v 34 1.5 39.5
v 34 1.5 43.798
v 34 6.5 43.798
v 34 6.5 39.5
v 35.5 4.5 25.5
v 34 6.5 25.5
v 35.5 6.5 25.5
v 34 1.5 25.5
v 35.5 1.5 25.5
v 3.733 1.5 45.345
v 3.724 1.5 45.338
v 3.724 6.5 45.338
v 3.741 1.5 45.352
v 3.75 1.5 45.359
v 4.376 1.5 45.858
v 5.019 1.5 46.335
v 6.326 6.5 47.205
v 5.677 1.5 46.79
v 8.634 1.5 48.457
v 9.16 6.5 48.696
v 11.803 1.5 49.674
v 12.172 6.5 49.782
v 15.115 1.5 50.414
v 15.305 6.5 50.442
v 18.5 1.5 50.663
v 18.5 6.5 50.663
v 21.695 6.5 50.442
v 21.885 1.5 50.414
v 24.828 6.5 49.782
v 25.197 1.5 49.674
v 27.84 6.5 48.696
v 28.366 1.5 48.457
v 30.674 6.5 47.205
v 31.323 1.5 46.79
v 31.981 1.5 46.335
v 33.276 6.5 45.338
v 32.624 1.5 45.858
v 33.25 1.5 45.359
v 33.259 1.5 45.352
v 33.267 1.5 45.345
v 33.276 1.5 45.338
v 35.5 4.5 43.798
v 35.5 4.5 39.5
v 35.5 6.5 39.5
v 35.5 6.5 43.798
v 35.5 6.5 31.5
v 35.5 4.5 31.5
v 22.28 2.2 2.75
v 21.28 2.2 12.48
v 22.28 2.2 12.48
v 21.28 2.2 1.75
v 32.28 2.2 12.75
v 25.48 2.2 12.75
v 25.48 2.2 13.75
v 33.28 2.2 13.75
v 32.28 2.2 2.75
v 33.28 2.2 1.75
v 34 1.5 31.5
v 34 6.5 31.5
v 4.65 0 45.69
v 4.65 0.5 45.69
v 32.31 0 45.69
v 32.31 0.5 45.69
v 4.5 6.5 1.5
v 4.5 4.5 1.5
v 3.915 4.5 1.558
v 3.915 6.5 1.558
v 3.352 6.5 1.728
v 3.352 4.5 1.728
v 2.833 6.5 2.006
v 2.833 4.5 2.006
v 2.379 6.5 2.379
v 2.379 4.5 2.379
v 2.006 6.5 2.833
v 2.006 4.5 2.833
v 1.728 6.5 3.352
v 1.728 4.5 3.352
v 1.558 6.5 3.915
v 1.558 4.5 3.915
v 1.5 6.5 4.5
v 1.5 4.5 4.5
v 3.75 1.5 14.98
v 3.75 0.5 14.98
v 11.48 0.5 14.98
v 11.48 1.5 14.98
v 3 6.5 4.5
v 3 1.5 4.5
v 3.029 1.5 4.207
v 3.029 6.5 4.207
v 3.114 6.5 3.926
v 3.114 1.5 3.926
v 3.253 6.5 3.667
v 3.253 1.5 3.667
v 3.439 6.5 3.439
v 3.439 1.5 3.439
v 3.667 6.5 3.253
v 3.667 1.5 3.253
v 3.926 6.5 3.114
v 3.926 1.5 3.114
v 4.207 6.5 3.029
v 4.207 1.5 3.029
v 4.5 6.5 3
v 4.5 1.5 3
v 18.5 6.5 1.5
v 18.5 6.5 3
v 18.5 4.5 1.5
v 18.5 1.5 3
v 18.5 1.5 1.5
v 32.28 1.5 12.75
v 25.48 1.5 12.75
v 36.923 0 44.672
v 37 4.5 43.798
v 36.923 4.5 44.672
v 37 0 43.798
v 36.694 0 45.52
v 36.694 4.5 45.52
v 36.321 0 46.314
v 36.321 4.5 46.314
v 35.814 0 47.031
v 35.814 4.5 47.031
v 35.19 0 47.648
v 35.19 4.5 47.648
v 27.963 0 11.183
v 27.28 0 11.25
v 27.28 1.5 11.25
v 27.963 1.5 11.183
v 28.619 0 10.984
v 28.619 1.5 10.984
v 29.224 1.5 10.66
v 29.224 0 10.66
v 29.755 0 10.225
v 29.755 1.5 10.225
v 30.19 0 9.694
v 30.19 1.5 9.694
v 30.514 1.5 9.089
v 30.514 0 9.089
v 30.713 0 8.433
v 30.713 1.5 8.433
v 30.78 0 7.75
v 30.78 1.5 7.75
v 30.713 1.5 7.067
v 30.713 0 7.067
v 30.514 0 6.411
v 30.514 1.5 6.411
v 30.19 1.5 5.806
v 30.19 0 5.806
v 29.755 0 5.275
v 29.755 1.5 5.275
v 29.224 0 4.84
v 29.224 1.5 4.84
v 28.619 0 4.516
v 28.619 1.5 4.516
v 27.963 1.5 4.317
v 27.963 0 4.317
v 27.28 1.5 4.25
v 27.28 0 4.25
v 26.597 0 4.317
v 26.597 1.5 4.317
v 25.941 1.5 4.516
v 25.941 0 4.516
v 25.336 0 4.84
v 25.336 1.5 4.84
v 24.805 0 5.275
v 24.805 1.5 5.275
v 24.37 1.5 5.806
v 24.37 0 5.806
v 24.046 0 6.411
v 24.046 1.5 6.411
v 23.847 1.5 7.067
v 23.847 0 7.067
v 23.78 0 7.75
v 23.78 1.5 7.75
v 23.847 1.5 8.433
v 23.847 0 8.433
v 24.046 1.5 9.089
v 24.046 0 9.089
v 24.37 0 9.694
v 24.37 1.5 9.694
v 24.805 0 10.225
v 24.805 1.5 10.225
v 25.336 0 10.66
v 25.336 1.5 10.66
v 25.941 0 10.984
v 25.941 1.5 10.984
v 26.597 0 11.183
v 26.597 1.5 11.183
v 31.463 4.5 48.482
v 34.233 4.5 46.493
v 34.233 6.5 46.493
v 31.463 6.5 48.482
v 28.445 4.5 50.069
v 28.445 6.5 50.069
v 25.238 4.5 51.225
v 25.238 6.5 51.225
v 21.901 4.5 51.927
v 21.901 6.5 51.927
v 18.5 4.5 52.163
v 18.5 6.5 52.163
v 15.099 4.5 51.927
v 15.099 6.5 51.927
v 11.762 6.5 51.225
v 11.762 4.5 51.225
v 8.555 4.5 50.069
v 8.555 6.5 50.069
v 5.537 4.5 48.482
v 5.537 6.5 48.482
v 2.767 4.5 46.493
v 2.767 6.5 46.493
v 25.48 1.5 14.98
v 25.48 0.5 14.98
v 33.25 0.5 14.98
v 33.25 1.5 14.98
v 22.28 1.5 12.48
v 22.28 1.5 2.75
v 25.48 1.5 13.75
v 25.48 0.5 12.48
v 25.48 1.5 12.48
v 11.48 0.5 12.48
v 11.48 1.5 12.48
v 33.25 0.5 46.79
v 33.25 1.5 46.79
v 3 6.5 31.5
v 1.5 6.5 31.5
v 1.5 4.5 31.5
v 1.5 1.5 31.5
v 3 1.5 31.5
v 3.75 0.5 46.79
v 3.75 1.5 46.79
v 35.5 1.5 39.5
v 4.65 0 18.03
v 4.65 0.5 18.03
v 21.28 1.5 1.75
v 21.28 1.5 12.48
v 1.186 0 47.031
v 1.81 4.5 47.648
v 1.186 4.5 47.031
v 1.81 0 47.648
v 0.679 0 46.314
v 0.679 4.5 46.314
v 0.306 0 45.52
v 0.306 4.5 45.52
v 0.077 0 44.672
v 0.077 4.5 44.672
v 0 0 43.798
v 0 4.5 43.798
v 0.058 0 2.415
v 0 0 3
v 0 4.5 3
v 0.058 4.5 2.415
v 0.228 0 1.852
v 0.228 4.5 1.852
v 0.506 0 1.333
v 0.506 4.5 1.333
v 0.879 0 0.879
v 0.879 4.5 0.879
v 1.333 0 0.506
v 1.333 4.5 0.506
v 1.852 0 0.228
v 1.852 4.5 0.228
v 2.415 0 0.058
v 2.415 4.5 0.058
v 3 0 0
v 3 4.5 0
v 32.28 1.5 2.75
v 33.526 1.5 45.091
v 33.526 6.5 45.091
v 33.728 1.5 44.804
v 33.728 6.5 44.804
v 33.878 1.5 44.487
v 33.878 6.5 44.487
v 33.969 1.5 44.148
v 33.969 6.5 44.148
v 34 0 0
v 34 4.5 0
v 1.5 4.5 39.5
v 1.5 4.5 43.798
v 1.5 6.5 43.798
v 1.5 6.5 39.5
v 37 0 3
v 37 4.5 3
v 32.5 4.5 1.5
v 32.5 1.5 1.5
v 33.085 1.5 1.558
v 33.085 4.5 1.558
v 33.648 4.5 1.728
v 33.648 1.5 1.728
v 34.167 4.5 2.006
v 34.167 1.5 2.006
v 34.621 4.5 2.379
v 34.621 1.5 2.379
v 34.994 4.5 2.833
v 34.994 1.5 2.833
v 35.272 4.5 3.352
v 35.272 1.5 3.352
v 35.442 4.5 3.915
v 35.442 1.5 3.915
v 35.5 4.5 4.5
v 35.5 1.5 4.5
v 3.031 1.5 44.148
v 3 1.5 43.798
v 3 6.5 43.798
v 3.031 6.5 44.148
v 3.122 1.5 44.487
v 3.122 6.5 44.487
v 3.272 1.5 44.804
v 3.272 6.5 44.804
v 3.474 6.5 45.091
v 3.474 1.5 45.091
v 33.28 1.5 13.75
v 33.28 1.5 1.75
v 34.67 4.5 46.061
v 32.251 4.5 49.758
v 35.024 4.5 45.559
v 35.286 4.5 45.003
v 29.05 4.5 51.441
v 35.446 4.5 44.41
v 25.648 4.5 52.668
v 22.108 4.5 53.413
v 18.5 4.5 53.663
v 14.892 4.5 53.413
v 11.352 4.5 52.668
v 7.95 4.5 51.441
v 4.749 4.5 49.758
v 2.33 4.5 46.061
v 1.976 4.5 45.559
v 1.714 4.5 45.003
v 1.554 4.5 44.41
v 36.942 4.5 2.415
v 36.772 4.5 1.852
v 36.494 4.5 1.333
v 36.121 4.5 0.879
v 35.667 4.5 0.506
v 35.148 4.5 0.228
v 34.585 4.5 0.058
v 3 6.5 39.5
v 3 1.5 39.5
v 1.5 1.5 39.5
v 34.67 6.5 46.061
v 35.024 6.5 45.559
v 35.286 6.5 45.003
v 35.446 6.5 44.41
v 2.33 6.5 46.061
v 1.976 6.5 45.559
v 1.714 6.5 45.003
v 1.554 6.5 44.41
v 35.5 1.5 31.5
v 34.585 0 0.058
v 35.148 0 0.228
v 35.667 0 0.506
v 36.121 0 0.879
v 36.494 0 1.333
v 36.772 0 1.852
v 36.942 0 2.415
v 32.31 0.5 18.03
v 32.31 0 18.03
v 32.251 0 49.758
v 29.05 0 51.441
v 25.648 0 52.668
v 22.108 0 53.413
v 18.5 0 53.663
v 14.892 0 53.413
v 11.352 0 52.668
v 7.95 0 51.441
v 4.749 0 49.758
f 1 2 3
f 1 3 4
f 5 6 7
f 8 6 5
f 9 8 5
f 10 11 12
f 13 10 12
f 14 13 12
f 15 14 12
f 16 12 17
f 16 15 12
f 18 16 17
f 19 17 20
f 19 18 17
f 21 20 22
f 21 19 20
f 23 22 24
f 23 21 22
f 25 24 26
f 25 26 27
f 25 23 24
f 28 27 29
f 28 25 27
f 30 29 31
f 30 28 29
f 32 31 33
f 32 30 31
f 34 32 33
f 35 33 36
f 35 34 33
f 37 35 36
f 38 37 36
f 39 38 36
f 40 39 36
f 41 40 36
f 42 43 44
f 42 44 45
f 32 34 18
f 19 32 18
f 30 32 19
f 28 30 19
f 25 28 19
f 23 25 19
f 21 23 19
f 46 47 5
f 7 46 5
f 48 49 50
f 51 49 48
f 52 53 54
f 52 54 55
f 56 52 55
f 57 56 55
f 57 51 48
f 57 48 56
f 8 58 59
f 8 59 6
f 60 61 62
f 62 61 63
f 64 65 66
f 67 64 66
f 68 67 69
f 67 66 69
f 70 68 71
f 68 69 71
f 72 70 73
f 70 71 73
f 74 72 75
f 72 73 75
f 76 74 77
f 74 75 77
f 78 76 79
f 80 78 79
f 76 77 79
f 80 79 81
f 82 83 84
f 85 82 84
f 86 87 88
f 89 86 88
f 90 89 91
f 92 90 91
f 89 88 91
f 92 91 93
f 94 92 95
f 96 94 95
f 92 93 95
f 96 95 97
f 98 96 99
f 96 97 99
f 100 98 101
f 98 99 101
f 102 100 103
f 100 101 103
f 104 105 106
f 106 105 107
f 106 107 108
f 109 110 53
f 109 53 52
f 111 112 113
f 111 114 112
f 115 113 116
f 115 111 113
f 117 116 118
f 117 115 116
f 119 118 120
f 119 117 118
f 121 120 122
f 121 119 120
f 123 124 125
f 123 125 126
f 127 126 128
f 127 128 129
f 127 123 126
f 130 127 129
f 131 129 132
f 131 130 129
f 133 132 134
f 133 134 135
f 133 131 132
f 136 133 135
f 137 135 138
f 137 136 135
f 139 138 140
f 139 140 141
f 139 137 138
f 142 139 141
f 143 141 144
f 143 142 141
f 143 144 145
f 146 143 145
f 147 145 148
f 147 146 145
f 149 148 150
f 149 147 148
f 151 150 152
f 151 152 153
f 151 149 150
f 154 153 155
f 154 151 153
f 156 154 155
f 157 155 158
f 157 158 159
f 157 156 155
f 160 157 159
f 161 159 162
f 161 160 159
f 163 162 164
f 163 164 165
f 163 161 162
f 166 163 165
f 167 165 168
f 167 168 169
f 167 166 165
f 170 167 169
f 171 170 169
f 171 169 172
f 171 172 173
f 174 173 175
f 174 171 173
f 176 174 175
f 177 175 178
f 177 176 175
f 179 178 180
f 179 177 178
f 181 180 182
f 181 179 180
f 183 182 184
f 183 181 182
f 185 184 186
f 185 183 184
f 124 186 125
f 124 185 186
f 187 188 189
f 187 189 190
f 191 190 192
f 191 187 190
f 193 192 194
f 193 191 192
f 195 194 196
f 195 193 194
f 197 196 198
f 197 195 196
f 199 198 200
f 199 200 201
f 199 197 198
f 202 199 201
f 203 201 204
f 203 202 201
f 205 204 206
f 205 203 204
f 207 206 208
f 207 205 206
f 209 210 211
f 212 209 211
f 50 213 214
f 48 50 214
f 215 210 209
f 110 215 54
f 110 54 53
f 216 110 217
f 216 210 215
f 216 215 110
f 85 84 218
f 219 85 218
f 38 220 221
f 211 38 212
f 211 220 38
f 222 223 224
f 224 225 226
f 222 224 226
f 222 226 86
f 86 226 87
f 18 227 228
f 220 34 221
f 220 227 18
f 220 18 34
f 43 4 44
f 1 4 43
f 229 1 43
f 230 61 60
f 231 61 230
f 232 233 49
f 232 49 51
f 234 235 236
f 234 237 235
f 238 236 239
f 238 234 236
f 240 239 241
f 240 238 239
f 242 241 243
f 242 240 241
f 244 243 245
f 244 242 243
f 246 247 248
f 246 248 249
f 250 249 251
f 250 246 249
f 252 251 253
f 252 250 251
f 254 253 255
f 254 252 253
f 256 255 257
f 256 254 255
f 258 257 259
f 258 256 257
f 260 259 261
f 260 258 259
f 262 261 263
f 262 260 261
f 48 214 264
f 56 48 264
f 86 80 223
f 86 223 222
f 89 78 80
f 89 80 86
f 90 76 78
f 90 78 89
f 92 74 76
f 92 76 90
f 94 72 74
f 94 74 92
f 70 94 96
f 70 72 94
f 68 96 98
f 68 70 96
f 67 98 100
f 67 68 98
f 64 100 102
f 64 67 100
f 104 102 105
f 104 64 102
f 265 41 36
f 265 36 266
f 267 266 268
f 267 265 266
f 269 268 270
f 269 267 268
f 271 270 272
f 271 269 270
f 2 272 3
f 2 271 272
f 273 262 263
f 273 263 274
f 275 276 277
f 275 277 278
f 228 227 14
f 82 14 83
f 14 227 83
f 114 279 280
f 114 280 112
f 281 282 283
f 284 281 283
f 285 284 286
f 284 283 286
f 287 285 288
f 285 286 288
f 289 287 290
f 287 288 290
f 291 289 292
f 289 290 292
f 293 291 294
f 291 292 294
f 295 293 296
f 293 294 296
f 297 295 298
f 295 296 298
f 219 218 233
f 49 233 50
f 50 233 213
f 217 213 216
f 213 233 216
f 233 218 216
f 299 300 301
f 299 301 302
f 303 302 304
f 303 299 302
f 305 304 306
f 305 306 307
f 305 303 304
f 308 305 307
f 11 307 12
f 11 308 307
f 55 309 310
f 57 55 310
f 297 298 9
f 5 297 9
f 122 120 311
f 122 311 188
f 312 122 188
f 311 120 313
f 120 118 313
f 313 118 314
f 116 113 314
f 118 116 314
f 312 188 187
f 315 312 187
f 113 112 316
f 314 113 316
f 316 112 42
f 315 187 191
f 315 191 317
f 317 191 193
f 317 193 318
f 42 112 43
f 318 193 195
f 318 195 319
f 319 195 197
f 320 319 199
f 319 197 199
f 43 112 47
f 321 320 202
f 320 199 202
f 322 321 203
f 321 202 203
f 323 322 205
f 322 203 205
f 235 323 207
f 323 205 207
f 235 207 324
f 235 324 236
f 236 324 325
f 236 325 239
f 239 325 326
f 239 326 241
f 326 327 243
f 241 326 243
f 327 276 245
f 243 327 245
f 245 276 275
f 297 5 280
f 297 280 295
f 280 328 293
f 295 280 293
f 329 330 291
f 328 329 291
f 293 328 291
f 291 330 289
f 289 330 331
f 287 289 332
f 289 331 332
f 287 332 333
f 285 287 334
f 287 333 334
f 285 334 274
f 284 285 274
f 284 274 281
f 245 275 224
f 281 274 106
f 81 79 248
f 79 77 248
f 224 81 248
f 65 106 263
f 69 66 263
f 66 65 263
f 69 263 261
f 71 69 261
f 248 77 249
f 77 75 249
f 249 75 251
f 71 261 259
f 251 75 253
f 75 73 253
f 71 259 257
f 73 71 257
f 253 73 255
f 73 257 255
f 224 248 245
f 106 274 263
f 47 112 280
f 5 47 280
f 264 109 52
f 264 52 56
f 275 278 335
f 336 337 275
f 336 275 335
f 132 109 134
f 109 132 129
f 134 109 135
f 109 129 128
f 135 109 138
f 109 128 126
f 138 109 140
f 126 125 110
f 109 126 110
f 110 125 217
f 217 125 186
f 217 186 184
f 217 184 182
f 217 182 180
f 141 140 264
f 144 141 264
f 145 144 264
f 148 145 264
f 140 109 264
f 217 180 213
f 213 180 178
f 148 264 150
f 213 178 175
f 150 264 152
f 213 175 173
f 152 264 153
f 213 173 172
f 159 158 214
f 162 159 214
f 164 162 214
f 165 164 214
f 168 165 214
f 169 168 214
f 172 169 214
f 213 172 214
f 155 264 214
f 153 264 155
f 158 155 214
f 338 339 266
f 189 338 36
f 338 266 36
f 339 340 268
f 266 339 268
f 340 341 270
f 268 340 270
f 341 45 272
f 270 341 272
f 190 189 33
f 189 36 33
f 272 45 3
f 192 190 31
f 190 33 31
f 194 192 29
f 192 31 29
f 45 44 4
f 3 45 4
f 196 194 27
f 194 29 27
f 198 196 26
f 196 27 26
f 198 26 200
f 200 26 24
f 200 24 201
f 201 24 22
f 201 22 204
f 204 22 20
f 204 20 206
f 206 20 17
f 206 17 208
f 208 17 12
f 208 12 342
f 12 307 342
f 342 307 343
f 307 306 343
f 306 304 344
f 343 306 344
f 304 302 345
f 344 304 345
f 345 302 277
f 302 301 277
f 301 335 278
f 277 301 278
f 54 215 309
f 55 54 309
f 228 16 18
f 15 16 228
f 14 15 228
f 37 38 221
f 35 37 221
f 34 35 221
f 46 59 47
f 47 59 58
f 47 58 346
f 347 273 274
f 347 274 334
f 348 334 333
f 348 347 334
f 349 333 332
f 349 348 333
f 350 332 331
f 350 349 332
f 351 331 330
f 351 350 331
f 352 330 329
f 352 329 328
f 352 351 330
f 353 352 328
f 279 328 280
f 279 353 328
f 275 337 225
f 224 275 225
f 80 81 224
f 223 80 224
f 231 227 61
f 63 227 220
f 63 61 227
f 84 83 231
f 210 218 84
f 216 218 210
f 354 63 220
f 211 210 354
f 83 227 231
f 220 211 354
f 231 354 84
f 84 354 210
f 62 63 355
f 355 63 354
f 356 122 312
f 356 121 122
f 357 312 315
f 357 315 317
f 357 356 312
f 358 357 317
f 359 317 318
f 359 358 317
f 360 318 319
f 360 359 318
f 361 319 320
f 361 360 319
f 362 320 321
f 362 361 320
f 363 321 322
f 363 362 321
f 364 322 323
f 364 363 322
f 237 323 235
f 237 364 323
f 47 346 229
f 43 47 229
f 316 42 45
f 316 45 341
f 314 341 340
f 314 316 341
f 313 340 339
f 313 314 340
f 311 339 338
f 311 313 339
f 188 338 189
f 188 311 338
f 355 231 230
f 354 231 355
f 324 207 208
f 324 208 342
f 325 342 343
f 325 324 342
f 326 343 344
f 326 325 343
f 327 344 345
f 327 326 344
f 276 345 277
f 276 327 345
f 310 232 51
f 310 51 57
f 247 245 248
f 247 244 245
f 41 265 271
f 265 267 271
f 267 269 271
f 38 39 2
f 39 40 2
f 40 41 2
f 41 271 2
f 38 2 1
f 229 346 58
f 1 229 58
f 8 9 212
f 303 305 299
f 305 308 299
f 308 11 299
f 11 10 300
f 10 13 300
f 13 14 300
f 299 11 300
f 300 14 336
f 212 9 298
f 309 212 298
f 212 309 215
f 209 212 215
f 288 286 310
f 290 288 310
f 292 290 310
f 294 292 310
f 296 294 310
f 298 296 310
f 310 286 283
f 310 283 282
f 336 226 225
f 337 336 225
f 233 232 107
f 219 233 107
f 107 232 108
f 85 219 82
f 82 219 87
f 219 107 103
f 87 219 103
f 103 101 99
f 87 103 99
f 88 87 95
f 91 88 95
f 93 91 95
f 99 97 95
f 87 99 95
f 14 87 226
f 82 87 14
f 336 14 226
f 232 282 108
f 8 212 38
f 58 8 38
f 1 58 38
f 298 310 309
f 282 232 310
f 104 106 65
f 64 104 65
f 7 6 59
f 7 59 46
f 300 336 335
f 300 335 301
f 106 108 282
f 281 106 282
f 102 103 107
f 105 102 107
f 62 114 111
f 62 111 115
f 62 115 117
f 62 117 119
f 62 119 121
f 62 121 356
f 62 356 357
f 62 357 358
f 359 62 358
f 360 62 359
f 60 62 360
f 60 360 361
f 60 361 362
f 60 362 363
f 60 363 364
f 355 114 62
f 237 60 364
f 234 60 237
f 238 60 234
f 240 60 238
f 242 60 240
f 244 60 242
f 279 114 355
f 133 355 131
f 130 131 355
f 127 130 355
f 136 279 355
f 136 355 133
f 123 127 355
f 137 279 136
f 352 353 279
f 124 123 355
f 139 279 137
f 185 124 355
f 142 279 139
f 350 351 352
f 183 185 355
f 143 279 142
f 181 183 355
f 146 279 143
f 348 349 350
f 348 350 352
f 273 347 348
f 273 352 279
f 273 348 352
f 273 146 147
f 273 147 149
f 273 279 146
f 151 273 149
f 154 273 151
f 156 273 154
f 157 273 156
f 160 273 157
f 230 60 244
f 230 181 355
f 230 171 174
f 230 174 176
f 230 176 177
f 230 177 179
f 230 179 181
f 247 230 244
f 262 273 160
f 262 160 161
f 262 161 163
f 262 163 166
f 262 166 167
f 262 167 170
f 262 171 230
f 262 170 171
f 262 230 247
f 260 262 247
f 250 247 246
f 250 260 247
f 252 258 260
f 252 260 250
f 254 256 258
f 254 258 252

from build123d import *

# Parameters (mm, degrees)
SKETCH1_R               = 3.5
BOSS_EXTRUDE1_DEPTH     = 1.5
BOSS_EXTRUDE2_DEPTH     = 3
SKETCH3_W               = 12
SKETCH3_H               = 12
SKETCH3_W_2             = 10
SKETCH3_H_2             = 10
BOSS_EXTRUDE3_DEPTH     = 0.7
SKETCH5_W               = 27.66
SKETCH5_H               = 27.66
CUT_EXTRUDE1_DEPTH      = 66.25114788
CUT_EXTRUDE2_DEPTH      = 66.25114788
CUT_EXTRUDE2_DEPTH_BACK = 1
SKETCH6_W               = 29.5
SKETCH6_H               = 31.81
CUT_EXTRUDE3_DEPTH      = 66.25114788
CUT_EXTRUDE3_DEPTH_BACK = 1
SKETCH4_W               = 14
SKETCH4_H               = 2.5
BOSS_EXTRUDE5_START     = -3
SKETCH8_W               = 1.5
SKETCH8_H               = 6
BOSS_EXTRUDE5_DEPTH     = 5


with BuildPart() as part:
    # Sketch1 → Boss-Extrude1 (new body)
    with BuildSketch(Plane(origin=(0, 0, 0), x_dir=(1, 0, 0), z_dir=(0, 1, 0))):
        with BuildLine():
            Line((0, -43.797867681), (0, -43))
            Line((0, -43), (0, -3))
            ThreePointArc((0, -3), (0.878679656, -0.878679656), (3, 0))
            Line((3, 0), (34, 0))
            ThreePointArc((34, 0), (36.121320344, -0.878679656), (37, -3))
            Line((37, -3), (37, -43))
            Line((37, -43), (37, -43.797867681))
            ThreePointArc((37, -43.797867681), (36.524802839, -45.925344888), (35.189536294, -47.648433643))
            ThreePointArc((35.189536294, -47.648433643), (18.5, -53.662950904), (1.810463706, -47.648433643))
            ThreePointArc((1.810463706, -47.648433643), (0.475197161, -45.925344888), (0, -43.797867681))
        make_face()
        with Locations(Location((27.28, -7.75, 0), (0, 0, 270))):
            Circle(SKETCH1_R, mode=Mode.SUBTRACT)
    extrude(amount=BOSS_EXTRUDE1_DEPTH)

    # Sketch2 → Boss-Extrude2 (add)
    with BuildSketch(Plane(origin=(0, 1.5, 0), x_dir=(1, 0, 0), z_dir=(0, 1, 0))):
        with BuildLine():
            Line((0, -43.797867681), (0, -43))
            Line((0, -43), (0, -3))
            ThreePointArc((0, -3), (0.878679656, -0.878679656), (3, 0))
            Line((3, 0), (34, 0))
            ThreePointArc((34, 0), (36.121320344, -0.878679656), (37, -3))
            Line((37, -3), (37, -43))
            Line((37, -43), (37, -43.797867681))
            ThreePointArc((37, -43.797867681), (36.524802839, -45.925344888), (35.189536294, -47.648433643))
            ThreePointArc((35.189536294, -47.648433643), (18.5, -53.662950904), (1.810463706, -47.648433643))
            ThreePointArc((1.810463706, -47.648433643), (0.475197161, -45.925344888), (0, -43.797867681))
        make_face()
        with BuildLine():
            Line((1.5, -43.797867681), (1.5, -43))
            Line((1.5, -43), (1.5, -4.5))
            ThreePointArc((1.5, -4.5), (2.378679656, -2.378679656), (4.5, -1.5))
            Line((4.5, -1.5), (32.5, -1.5))
            ThreePointArc((32.5, -1.5), (34.621320344, -2.378679656), (35.5, -4.5))
            Line((35.5, -4.5), (35.5, -43))
            Line((35.5, -43), (35.5, -43.797867681))
            ThreePointArc((35.5, -43.797867681), (35.167361988, -45.287101726), (34.232675406, -46.493263855))
            ThreePointArc((34.232675406, -46.493263855), (18.5, -52.162950904), (2.767324594, -46.493263855))
            ThreePointArc((2.767324594, -46.493263855), (1.832638012, -45.287101726), (1.5, -43.797867681))
        make_face(mode=Mode.SUBTRACT)
    extrude(amount=BOSS_EXTRUDE2_DEPTH)

    # Sketch3 → Boss-Extrude3 (add)
    with BuildSketch(Plane(origin=(0, 1.5, 0), x_dir=(1, 0, 0), z_dir=(0, 1, 0))):
        with Locations((27.28, -7.75)):
            Rectangle(SKETCH3_W, SKETCH3_H)
        with Locations((27.28, -7.75)):
            Rectangle(SKETCH3_W_2, SKETCH3_H_2, mode=Mode.SUBTRACT)
    extrude(amount=BOSS_EXTRUDE3_DEPTH)

    # Sketch5 → Cut-Extrude1 (cut, through all)
    with BuildSketch(Plane(origin=(0, 1.5, 0), x_dir=(1, 0, 0), z_dir=(0, 1, 0))):
        with Locations((18.48, -31.86)):
            Rectangle(SKETCH5_W, SKETCH5_H)
    extrude(amount=-CUT_EXTRUDE1_DEPTH, mode=Mode.SUBTRACT)

    # Sketch6 → Cut-Extrude2 (cut, two sides: drawn at the far end of the back side and taken through both)
    with BuildSketch(Plane(origin=(0, 1.5, 0), x_dir=(1, 0, 0), z_dir=(0, 1, 0)).offset(-CUT_EXTRUDE2_DEPTH_BACK)):
        with Locations((18.5, -30.885)):
            Rectangle(SKETCH6_W, SKETCH6_H)
    extrude(amount=CUT_EXTRUDE2_DEPTH + CUT_EXTRUDE2_DEPTH_BACK, mode=Mode.SUBTRACT)

    # Sketch4 → Cut-Extrude3 (cut, two sides: drawn at the far end of the back side and taken through both)
    with BuildSketch(Plane(origin=(0, 1.5, 0), x_dir=(1, 0, 0), z_dir=(0, 1, 0)).offset(-CUT_EXTRUDE3_DEPTH_BACK)):
        with Locations((18.48, -13.73)):
            Rectangle(SKETCH4_W, SKETCH4_H)
    extrude(amount=CUT_EXTRUDE3_DEPTH + CUT_EXTRUDE3_DEPTH_BACK, mode=Mode.SUBTRACT)

    # Sketch8 → Boss-Extrude5 (add)
    with BuildSketch(Plane(origin=(0, 4.5, 0), x_dir=(1, 0, 0), z_dir=(0, 1, 0)).offset(BOSS_EXTRUDE5_START)):
        with BuildLine():
            Line((1.5, -4.5), (1.5, -31.5))
            Line((1.5, -31.5), (3, -31.5))
            Line((3, -31.5), (3, -4.5))
            ThreePointArc((3, -4.5), (3.439339828, -3.439339828), (4.5, -3))
            Line((4.5, -3), (18.5, -3))
            Line((18.5, -3), (18.5, -1.5))
            Line((18.5, -1.5), (4.5, -1.5))
            ThreePointArc((4.5, -1.5), (2.378679656, -2.378679656), (1.5, -4.5))
        make_face()
        with Locations((34.75, -28.5)):
            Rectangle(SKETCH8_W, SKETCH8_H)
        with BuildLine():
            Line((35.5, -43), (35.5, -43.797867681))
            ThreePointArc((35.5, -43.797867681), (35.167361988, -45.287101726), (34.232675406, -46.493263855))
            ThreePointArc((34.232675406, -46.493263855), (18.5, -52.162950904), (2.767324594, -46.493263855))
            ThreePointArc((2.767324594, -46.493263855), (1.832638012, -45.287101726), (1.5, -43.797867681))
            Line((1.5, -43.797867681), (1.5, -43))
            Line((1.5, -43), (1.5, -39.5))
            Line((1.5, -39.5), (3, -39.5))
            Line((3, -39.5), (3, -43))
            Line((3, -43), (3, -43.797867681))
            ThreePointArc((3, -43.797867681), (3.190078864, -44.648858564), (3.724185482, -45.338094066))
            ThreePointArc((3.724185482, -45.338094066), (18.5, -50.662950904), (33.275814518, -45.338094066))
            ThreePointArc((33.275814518, -45.338094066), (33.809921136, -44.648858564), (34, -43.797867681))
            Line((34, -43.797867681), (34, -43))
            Line((34, -43), (34, -39.5))
            Line((34, -39.5), (35.5, -39.5))
            Line((35.5, -39.5), (35.5, -43))
        make_face()
    extrude(amount=BOSS_EXTRUDE5_DEPTH)


solid = part.part
